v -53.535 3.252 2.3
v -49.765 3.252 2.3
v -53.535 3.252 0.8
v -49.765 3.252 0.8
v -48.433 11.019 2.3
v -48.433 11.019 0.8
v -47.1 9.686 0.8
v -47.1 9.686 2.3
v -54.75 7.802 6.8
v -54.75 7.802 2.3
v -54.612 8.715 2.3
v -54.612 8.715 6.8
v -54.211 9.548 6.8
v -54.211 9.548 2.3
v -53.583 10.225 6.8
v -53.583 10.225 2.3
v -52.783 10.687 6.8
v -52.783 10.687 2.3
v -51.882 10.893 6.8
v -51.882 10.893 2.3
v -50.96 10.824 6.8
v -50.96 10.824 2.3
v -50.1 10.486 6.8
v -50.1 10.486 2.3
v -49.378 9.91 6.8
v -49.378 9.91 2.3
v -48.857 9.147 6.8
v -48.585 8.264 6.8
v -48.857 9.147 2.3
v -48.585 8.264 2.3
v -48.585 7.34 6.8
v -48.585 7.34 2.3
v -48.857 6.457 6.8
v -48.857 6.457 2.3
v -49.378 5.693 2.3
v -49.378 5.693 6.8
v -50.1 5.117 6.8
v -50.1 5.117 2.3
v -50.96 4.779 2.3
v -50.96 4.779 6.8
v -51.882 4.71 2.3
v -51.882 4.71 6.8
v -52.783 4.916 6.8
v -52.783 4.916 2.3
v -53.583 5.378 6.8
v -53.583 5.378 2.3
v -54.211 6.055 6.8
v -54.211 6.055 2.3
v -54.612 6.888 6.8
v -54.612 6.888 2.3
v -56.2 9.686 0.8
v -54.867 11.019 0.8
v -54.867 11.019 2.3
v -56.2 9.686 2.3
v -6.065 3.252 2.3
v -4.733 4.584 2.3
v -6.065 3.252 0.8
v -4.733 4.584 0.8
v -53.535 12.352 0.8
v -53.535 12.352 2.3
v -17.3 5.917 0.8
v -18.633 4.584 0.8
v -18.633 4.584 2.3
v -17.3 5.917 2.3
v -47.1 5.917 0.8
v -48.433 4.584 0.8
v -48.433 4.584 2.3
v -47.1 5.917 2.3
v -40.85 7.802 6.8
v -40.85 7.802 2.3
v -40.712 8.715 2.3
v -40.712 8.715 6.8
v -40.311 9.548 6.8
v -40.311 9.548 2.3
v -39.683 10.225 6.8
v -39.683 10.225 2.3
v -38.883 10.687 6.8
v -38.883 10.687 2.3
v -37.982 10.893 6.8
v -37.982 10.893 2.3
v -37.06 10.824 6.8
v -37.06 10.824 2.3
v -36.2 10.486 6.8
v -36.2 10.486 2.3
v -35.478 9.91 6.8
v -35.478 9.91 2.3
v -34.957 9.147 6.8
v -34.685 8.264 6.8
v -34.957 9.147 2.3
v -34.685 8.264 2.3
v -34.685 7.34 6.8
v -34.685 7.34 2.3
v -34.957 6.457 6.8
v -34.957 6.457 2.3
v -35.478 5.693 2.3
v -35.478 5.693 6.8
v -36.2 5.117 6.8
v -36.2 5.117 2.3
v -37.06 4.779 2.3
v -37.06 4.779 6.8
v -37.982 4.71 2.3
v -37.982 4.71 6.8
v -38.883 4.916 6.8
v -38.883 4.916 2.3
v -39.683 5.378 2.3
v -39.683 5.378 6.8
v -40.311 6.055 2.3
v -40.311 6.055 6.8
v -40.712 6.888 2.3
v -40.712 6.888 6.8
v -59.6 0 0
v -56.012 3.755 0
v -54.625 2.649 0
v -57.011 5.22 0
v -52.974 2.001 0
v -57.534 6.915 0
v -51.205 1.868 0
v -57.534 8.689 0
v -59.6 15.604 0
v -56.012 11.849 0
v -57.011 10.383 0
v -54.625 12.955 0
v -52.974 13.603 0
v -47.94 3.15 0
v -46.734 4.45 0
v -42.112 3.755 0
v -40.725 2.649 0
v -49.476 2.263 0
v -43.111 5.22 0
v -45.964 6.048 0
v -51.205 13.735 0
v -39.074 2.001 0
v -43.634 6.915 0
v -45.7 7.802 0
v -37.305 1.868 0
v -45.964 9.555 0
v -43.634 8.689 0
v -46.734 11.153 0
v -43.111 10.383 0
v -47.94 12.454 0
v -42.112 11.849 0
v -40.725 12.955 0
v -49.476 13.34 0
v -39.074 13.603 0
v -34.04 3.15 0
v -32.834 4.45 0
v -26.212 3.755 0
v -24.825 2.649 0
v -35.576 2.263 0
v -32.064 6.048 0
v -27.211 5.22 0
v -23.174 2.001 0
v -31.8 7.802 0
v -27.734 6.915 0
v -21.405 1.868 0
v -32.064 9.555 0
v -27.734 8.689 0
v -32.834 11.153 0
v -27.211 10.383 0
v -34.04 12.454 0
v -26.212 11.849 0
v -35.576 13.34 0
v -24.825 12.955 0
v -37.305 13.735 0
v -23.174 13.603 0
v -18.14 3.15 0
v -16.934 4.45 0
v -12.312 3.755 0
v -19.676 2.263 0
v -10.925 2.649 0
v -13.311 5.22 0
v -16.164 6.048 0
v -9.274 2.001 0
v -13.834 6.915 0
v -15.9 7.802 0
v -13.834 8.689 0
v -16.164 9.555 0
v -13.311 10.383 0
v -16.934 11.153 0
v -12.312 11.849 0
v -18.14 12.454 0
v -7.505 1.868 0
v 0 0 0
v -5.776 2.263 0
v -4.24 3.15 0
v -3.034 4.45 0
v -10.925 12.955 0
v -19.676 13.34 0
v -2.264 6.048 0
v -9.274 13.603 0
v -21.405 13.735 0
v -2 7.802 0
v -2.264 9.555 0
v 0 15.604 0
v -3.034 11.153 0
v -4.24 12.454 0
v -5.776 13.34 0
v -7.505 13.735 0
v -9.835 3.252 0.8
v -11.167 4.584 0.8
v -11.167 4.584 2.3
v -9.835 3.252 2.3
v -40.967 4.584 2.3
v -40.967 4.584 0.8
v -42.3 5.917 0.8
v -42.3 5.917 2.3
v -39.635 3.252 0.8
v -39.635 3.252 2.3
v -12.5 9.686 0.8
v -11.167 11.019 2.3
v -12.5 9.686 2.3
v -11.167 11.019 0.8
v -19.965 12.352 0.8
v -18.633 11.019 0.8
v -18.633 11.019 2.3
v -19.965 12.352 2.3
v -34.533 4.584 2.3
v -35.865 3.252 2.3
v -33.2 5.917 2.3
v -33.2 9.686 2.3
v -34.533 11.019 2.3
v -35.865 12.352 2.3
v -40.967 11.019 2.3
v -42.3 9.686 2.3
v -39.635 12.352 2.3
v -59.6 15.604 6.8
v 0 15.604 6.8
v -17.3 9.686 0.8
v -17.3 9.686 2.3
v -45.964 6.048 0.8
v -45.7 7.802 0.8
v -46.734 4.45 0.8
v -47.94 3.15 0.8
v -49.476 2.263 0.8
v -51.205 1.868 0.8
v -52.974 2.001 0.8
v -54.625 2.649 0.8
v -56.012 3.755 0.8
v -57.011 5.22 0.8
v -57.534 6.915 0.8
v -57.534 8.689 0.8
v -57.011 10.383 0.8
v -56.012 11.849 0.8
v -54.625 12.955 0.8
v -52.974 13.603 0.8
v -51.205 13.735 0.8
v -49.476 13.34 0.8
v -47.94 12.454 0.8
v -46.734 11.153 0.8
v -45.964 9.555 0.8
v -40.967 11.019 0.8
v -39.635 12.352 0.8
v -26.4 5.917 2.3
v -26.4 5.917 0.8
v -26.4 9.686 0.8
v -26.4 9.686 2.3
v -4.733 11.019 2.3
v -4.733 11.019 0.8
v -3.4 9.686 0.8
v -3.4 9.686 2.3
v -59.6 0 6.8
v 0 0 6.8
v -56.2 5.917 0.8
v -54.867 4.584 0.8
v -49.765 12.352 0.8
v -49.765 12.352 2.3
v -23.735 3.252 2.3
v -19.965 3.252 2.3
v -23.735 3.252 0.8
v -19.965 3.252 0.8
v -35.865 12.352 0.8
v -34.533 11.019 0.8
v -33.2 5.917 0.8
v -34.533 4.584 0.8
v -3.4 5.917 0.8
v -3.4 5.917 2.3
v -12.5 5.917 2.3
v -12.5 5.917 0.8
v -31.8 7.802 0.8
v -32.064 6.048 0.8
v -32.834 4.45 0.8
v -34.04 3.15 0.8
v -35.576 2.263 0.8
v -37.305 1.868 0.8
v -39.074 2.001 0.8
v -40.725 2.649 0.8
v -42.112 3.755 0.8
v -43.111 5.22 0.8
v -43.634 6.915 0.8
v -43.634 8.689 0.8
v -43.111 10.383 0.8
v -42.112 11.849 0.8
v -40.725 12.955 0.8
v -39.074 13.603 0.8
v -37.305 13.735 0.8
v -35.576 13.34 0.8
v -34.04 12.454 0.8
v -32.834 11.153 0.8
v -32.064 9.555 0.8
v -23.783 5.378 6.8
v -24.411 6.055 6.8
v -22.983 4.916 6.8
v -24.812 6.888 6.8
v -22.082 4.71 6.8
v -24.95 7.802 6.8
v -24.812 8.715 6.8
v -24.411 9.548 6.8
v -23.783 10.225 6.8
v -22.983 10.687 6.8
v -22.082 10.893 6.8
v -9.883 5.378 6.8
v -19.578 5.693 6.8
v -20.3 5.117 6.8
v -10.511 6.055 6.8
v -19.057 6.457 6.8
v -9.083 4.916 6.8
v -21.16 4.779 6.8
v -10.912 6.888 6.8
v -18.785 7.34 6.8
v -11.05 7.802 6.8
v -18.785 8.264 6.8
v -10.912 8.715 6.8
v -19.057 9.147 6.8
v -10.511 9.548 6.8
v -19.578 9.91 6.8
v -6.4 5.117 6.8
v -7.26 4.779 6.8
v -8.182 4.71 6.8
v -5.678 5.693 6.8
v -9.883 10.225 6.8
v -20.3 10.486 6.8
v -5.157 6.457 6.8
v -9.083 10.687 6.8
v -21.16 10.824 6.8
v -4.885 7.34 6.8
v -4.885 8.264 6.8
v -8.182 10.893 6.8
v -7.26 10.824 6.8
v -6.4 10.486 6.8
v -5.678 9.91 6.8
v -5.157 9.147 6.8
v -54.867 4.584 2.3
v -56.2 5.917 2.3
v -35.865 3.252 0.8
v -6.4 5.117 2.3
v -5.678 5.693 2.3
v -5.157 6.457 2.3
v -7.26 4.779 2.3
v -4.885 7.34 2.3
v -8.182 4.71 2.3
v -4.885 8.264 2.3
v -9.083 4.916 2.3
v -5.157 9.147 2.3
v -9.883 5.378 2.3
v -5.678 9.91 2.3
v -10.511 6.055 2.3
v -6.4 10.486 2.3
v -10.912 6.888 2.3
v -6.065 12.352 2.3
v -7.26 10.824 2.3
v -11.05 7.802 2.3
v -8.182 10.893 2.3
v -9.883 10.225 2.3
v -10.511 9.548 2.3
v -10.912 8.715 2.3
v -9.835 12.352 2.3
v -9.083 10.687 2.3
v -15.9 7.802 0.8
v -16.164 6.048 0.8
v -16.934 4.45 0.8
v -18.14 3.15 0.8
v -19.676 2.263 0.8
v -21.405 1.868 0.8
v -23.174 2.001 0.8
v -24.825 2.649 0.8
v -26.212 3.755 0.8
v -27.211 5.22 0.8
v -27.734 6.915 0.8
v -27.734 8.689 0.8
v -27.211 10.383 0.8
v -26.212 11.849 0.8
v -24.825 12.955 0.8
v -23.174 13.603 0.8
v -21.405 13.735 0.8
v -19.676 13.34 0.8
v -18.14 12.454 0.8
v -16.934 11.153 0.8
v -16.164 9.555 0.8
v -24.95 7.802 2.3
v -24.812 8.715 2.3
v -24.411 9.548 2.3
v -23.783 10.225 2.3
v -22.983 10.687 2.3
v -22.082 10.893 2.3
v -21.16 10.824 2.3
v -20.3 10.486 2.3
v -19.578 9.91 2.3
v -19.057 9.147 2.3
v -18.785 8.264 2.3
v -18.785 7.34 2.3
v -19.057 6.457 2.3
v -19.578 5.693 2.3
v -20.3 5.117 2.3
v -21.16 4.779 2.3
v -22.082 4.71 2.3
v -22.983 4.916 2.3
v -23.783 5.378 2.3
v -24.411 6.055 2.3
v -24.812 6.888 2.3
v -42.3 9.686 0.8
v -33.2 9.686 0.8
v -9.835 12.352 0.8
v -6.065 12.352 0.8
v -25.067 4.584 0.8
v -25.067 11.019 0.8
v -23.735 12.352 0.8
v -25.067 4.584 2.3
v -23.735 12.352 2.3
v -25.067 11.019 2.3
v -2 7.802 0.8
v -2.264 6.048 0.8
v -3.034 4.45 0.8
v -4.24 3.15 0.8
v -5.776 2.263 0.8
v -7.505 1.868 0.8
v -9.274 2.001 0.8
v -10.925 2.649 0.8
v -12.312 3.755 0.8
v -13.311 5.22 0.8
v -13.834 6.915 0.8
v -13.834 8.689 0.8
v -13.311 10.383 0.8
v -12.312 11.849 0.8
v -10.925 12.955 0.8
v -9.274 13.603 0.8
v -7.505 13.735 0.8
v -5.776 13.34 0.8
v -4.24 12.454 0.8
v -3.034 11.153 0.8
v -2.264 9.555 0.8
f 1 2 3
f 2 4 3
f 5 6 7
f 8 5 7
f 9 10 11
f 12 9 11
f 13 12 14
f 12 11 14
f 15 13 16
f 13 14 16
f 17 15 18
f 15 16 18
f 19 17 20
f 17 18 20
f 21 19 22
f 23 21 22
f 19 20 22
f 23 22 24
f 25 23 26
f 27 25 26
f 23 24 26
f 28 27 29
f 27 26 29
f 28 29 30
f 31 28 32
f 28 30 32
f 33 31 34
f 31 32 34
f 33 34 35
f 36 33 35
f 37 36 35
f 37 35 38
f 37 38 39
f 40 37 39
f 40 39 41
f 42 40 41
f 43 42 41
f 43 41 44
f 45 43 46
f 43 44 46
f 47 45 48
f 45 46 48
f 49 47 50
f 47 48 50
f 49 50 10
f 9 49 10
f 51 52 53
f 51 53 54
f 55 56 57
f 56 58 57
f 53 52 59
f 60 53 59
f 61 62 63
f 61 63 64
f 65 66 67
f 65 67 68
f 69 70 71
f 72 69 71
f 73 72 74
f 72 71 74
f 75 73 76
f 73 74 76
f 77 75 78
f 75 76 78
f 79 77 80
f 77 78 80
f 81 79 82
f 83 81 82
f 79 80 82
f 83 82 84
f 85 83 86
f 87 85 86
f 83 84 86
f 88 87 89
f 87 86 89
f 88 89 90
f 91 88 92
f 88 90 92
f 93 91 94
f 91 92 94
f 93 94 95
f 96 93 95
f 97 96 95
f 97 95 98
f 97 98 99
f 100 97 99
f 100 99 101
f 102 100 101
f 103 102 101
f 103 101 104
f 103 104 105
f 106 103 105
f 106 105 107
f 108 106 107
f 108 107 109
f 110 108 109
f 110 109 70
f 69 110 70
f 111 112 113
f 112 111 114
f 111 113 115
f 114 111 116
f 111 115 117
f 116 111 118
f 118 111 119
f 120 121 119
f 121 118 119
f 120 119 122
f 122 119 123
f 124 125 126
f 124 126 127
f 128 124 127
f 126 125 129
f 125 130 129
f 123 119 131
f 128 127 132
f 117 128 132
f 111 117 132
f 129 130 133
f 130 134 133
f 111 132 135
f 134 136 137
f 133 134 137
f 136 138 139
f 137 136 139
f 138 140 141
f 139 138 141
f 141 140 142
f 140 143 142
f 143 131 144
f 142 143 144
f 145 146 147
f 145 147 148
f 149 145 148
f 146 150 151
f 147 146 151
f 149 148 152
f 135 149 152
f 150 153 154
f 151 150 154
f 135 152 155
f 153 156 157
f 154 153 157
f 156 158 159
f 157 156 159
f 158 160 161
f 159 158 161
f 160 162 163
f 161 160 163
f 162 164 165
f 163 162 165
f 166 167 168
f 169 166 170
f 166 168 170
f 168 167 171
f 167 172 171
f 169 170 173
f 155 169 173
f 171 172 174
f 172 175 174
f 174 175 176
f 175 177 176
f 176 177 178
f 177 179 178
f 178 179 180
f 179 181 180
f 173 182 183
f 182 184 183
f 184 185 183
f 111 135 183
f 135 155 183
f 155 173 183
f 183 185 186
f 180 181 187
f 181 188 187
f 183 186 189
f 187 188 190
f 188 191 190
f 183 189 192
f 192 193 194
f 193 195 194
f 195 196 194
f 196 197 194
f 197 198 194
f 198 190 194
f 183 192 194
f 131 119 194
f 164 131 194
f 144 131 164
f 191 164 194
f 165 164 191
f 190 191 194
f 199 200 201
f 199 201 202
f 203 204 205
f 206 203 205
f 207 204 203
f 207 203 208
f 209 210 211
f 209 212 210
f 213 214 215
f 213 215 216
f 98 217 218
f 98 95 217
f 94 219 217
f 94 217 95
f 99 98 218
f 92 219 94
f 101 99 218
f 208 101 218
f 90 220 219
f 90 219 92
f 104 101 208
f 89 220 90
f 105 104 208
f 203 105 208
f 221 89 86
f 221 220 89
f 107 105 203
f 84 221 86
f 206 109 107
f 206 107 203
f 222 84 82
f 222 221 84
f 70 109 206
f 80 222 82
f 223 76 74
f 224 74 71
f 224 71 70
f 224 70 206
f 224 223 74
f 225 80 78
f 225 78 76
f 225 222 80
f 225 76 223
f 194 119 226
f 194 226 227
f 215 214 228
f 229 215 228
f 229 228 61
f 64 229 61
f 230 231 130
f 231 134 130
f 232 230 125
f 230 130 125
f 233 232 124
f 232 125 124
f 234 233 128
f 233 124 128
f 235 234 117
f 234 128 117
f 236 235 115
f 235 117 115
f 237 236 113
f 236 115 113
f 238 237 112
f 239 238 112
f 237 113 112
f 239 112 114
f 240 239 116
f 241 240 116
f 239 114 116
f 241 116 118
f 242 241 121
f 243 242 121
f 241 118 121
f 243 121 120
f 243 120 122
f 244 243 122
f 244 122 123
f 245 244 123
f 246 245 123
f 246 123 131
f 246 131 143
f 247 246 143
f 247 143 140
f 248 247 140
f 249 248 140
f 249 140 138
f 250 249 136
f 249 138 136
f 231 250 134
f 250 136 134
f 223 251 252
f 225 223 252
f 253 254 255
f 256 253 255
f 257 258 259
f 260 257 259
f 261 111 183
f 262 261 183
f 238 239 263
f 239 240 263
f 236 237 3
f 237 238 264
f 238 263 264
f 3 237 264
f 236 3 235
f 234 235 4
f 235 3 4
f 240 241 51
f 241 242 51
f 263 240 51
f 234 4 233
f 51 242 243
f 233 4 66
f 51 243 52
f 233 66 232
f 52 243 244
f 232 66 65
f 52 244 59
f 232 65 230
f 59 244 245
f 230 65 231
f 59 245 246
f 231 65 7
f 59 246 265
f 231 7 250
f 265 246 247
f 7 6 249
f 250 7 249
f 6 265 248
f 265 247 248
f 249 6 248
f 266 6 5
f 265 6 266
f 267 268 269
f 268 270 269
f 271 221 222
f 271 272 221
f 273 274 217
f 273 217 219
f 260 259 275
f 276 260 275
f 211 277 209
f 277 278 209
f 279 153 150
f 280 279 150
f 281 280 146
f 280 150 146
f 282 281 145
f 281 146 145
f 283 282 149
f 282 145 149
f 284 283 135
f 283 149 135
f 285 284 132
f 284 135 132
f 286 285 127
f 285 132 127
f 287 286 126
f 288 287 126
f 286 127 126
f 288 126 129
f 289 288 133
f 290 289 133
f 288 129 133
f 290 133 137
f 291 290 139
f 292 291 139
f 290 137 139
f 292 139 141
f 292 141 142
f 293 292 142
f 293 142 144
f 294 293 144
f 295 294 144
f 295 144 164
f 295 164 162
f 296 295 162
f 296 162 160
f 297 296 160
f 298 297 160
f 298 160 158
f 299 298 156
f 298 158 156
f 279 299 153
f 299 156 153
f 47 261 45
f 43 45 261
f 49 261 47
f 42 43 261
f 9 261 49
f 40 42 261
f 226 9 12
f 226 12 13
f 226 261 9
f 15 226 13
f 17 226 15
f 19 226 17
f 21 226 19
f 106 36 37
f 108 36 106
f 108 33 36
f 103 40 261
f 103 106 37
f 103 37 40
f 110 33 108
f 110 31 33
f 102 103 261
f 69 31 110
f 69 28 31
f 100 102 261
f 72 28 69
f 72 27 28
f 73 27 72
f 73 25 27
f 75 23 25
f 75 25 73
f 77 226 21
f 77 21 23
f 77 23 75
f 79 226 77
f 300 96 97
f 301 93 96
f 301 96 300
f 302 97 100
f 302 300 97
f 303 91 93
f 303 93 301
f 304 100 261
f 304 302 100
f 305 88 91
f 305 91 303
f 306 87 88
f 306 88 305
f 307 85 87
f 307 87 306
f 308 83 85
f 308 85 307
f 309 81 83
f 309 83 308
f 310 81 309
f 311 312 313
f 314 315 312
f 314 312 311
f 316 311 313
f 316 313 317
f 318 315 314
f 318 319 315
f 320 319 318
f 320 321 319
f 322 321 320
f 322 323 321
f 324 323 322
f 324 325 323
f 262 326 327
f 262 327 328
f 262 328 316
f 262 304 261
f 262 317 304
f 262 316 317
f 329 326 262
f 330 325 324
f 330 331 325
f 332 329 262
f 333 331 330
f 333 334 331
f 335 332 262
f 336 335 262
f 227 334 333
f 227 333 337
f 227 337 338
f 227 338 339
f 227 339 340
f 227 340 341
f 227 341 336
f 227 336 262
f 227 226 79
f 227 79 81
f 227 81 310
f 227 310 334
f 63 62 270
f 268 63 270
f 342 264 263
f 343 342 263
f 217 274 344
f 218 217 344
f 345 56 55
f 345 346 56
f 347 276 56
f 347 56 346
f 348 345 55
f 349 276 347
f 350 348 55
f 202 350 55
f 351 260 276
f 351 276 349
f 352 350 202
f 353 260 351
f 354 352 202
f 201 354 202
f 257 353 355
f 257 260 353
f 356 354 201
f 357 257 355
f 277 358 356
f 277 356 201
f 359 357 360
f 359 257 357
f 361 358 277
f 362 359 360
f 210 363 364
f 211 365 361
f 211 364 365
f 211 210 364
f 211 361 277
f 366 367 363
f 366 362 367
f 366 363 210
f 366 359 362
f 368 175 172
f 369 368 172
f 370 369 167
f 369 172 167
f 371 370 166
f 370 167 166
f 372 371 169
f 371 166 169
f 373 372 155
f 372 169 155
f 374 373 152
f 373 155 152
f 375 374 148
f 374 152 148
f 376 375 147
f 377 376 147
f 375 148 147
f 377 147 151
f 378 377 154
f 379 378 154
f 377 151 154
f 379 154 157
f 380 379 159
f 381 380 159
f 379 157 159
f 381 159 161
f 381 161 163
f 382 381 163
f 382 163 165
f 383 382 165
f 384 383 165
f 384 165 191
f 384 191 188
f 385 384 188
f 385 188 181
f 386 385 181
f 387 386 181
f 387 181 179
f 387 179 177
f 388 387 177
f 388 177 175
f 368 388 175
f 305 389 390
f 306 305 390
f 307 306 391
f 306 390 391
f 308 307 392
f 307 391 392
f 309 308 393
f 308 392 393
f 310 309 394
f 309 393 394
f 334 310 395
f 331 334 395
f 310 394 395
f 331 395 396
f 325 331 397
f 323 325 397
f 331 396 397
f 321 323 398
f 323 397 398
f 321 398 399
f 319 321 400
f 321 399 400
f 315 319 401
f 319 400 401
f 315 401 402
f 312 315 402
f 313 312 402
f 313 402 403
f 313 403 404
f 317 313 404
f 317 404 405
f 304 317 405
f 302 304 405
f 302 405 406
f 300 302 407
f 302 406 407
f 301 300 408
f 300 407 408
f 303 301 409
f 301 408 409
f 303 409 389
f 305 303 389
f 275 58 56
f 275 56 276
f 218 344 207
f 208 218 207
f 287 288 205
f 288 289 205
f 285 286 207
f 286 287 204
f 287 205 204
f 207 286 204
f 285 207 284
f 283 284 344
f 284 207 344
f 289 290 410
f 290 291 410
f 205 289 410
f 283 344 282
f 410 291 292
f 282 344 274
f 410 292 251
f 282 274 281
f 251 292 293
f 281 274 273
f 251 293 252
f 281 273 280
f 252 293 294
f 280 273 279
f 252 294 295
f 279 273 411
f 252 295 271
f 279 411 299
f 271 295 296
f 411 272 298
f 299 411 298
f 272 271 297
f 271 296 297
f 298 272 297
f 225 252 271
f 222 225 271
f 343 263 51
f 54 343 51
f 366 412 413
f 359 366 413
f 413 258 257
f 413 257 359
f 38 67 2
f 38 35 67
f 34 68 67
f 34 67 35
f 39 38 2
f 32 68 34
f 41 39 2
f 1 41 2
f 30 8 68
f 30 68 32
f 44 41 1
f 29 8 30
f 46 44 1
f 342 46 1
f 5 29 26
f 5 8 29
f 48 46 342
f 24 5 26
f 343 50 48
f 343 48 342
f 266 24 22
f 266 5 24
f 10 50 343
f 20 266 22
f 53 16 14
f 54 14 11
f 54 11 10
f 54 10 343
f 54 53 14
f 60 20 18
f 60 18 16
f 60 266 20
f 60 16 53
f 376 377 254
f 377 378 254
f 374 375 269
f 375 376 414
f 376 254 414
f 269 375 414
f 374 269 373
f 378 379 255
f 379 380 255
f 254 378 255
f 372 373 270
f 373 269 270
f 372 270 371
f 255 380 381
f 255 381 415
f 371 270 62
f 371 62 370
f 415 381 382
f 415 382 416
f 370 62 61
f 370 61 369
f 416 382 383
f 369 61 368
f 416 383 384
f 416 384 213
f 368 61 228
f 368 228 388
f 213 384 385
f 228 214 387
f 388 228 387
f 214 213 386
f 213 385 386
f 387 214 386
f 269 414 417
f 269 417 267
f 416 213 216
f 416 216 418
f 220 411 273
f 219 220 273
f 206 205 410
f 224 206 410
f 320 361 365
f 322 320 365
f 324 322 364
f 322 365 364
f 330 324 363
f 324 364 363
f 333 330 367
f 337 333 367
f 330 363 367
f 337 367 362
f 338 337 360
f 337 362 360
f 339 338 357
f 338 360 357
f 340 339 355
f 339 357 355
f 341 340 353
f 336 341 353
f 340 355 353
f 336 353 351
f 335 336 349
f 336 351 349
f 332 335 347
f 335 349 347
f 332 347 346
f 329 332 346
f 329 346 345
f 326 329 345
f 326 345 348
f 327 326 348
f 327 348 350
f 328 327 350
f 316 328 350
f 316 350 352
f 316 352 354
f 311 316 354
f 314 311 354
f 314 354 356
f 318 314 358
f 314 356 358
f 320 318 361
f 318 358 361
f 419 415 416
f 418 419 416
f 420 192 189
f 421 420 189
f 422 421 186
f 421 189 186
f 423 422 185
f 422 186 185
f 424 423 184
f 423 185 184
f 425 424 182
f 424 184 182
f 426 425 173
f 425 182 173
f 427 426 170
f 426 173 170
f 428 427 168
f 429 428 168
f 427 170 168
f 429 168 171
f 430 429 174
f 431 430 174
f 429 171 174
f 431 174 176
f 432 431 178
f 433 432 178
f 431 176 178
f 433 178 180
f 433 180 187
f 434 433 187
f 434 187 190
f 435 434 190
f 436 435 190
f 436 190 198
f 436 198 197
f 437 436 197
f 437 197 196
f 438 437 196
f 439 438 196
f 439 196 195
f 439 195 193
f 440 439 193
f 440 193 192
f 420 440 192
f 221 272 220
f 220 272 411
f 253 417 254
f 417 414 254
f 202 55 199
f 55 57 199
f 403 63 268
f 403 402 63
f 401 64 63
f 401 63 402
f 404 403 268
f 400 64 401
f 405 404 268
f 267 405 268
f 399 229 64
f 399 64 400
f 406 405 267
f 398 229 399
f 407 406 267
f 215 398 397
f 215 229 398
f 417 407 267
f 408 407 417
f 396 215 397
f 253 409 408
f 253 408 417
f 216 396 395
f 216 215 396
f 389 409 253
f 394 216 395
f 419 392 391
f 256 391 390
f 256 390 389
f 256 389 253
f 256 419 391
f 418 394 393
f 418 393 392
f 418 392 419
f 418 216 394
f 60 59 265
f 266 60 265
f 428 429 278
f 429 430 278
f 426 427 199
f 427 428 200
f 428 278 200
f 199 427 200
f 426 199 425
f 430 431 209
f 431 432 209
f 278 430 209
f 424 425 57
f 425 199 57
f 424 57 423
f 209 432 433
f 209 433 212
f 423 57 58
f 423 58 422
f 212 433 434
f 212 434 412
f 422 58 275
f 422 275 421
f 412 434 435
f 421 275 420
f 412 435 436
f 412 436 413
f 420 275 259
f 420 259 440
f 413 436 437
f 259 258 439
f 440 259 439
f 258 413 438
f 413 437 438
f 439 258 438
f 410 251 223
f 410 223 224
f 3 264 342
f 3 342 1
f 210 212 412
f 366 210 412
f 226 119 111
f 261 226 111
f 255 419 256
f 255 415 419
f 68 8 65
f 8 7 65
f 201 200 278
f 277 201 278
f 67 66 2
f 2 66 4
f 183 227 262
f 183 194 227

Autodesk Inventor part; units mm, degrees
ref_plane "YZ Plane" through (0, 0, 0) normal (1, 0, 0) x (0, 1, 0)
ref_plane "XZ Plane" through (0, 0, 0) normal (0, 1, 0) x (-1, 0, 0)
ref_plane "XY Plane" through (0, 0, 0) normal (0, 0, 1) x (1, 0, 0)
sketch "Sketch1" plane through (0, 0, 0) normal (0, 0, 1) x (1, 0, 0)
  line L0 (0, 0) -> (-29.8, 0)
  line L1 (0, 15.6035) -> (0, 0)
  circle A0 centre (-7.95, 7.8017) radius 5.95
  circle A1 centre (-21.85, 7.8017) radius 5.95
  line L2 (-29.8, 15.6035) -> (-29.8, 0)
  line L3 (-29.8, 15.6035) -> (0, 15.6035)
  line L4 (-29.8, 0) -> (-60, 0)
  line L5 (-21.85, 7.8017) -> (-21.85, 15.6035)
  line L6 (-21.85, 7.8017) -> (-21.85, 0)
  line L7 (-7.95, 7.8017) -> (-7.95, 0)
  line L8 (-7.95, 7.8017) -> (-7.95, 15.6035)
  line L9 (-59.6, 0) -> (-29.8, 0)
  line L10 (-59.6, 15.6035) -> (-59.6, 0)
  circle A2 centre (-51.65, 7.8017) radius 5.95
  circle A3 centre (-37.75, 7.8017) radius 5.95
  line L11 (-29.8, 15.6035) -> (-59.6, 15.6035)
  line L12 (-37.75, 7.8017) -> (-37.75, 15.6035)
  line L13 (-37.75, 7.8017) -> (-37.75, 0)
  line L14 (-51.65, 7.8017) -> (-51.65, 0)
  line L15 (-51.65, 7.8017) -> (-51.65, 15.6035)
  point P0 (0, 7.8017)
  point P1 (-59.6, 7.8017)
  dimension "d0" = 11.9
  dimension "d1" = 11.9
  dimension "d7" = 7.95
  dimension "d8" = 13.9
  dimension "d9" = 7.95
extrude "Extrusion1" add sketch "Sketch1" along normal blind 0.8 contours L0 L7 A0 L8 L3 L1 | L0 L6 A1 L5 L3 L8 A0 L7 | L0 L2 L3 L5 A1 L6 | L4 L13 A3 L12 L11 L2 | L4 L14 A2 L15 L11 L12 A3 L13 | L4 L10 L11 L15 A2 L14
sketch "Sketch2" plane through (0, 0, 0.8) normal (0, 0, 1) x (1, 0, 0)
  line L0 (-59.6, 15.6035) -> (-59.6, 0) projected
  line L1 (-59.6, 0) -> (0, 0) projected
  line L2 (-59.6, 15.6035) -> (0, 15.6035)
  line L3 (0, 15.6035) -> (0, 0)
  line L4 (0, 0) -> (-59.6, 0)
  line L5 (-59.6, 0) -> (-59.6, 15.6035)
extrude "Extrusion2" add sketch "Sketch2" along normal blind 6
sketch "Sketch3" plane through (-7.95, 7.8017, 0.8) normal (0, 0, -1) x (-1, 0, 0)
  circle A0 centre (0, 0) radius 5.95 projected
  line L0 (0, 0) -> (-4.55, 0)
  line L1 (0, 0) -> (4.55, 0)
  line L2 (0, 0) -> (0, 4.55)
  line L3 (0, 0) -> (0, -4.55)
  line L4 (-4.55, 0) -> (-4.55, -1.8847)
  line L5 (0, 0) -> (2.5958, -2.5958)
  line L6 (0, 0) -> (3.671, 0) construction
  line L7 (3.2173, -3.2173) -> (-3.2173, 3.2173)
  line L8 (0, 0) -> (-3.2173, -3.2173)
  line L9 (0, 0) -> (3.2173, 3.2173)
  line L10 (-3.2173, -3.2173) -> (-1.8847, -4.55)
  line L11 (-3.2173, -3.2173) -> (-4.55, -1.8847)
  line L12 (3.2173, -3.2173) -> (1.8847, -4.55)
  line L13 (3.2173, -3.2173) -> (4.55, -1.8847)
  line L14 (4.55, 0) -> (4.55, -1.8847)
  line L15 (4.55, 0) -> (4.55, 1.8847)
  line L16 (3.2173, 3.2173) -> (4.55, 1.8847)
  line L17 (3.2173, 3.2173) -> (1.8847, 4.55)
  line L18 (0, 4.55) -> (1.8847, 4.55)
  line L19 (0, 4.55) -> (-1.8847, 4.55)
  line L20 (-3.2173, 3.2173) -> (-1.8847, 4.55)
  line L21 (-3.2173, 3.2173) -> (-4.55, 1.8847)
  line L22 (0, -4.55) -> (1.8847, -4.55)
  line L23 (0, -4.55) -> (-1.8847, -4.55)
  line L24 (-4.55, 0) -> (-4.55, 1.8847)
  line L25 (5.95, 0) -> (7.95, 0)
  circle A1 centre (13.9, 0) radius 5.95 projected
  line L26 (6.95, 0) -> (6.95, 2.7112)
  line L27 (-7.95, 7.8017) -> (51.65, 7.8017) projected
  circle A2 centre (13.9, 0) radius 5.95
  line L28 (13.9, 0) -> (18.45, 0)
  line L29 (13.9, 0) -> (9.35, 0)
  line L30 (13.9, 0) -> (13.9, 4.55)
  line L31 (13.9, 0) -> (13.9, -4.55)
  line L32 (18.45, 0) -> (18.45, -1.8847)
  line L33 (13.9, 0) -> (11.3042, -2.5958)
  line L34 (13.9, 0) -> (10.229, 0) construction
  line L35 (10.6827, -3.2173) -> (17.1173, 3.2173)
  line L36 (13.9, 0) -> (17.1173, -3.2173)
  line L37 (13.9, 0) -> (10.6827, 3.2173)
  line L38 (17.1173, -3.2173) -> (15.7847, -4.55)
  line L39 (17.1173, -3.2173) -> (18.45, -1.8847)
  line L40 (10.6827, -3.2173) -> (12.0153, -4.55)
  line L41 (10.6827, -3.2173) -> (9.35, -1.8847)
  line L42 (9.35, 0) -> (9.35, -1.8847)
  line L43 (9.35, 0) -> (9.35, 1.8847)
  line L44 (10.6827, 3.2173) -> (9.35, 1.8847)
  line L45 (10.6827, 3.2173) -> (12.0153, 4.55)
  line L46 (13.9, 4.55) -> (12.0153, 4.55)
  line L47 (13.9, 4.55) -> (15.7847, 4.55)
  line L48 (17.1173, 3.2173) -> (15.7847, 4.55)
  line L49 (17.1173, 3.2173) -> (18.45, 1.8847)
  line L50 (13.9, -4.55) -> (12.0153, -4.55)
  line L51 (13.9, -4.55) -> (15.7847, -4.55)
  line L52 (18.45, 0) -> (18.45, 1.8847)
  line L53 (21.85, 7.8017) -> (21.85, -7.8017)
  line L54 (51.65, -7.8017) -> (-7.95, -7.8017) projected
  circle A3 centre (43.7, 0) radius 5.95
  line L55 (43.7, 0) -> (48.25, 0)
  line L56 (43.7, 0) -> (39.15, 0)
  line L57 (43.7, 0) -> (43.7, 4.55)
  line L58 (43.7, 0) -> (43.7, -4.55)
  line L59 (48.25, 0) -> (48.25, -1.8847)
  line L60 (43.7, 0) -> (41.1042, -2.5958)
  line L61 (43.7, 0) -> (40.029, 0) construction
  line L62 (40.4827, -3.2173) -> (46.9173, 3.2173)
  line L63 (43.7, 0) -> (46.9173, -3.2173)
  line L64 (43.7, 0) -> (40.4827, 3.2173)
  line L65 (46.9173, -3.2173) -> (45.5847, -4.55)
  line L66 (46.9173, -3.2173) -> (48.25, -1.8847)
  line L67 (40.4827, -3.2173) -> (41.8153, -4.55)
  line L68 (40.4827, -3.2173) -> (39.15, -1.8847)
  line L69 (39.15, 0) -> (39.15, -1.8847)
  line L70 (39.15, 0) -> (39.15, 1.8847)
  line L71 (40.4827, 3.2173) -> (39.15, 1.8847)
  line L72 (40.4827, 3.2173) -> (41.8153, 4.55)
  line L73 (43.7, 4.55) -> (41.8153, 4.55)
  line L74 (43.7, 4.55) -> (45.5847, 4.55)
  line L75 (46.9173, 3.2173) -> (45.5847, 4.55)
  line L76 (46.9173, 3.2173) -> (48.25, 1.8847)
  line L77 (43.7, -4.55) -> (41.8153, -4.55)
  line L78 (43.7, -4.55) -> (45.5847, -4.55)
  line L79 (48.25, 0) -> (48.25, 1.8847)
  line L80 (37.75, 0) -> (35.75, 0)
  circle A4 centre (29.8, 0) radius 5.95
  line L81 (36.75, 0) -> (36.75, 2.7112)
  line L82 (25.25, 0) -> (25.25, 1.8847)
  line L83 (25.25, 0) -> (25.25, -1.8847)
  line L84 (29.8, 0) -> (25.25, 0)
  line L85 (29.8, 0) -> (29.8, 4.55)
  line L86 (29.8, 0) -> (29.8, -4.55)
  line L87 (29.8, -4.55) -> (27.9153, -4.55)
  line L88 (29.8, 4.55) -> (31.6847, 4.55)
  line L89 (29.8, 0) -> (33.0173, 3.2173)
  line L90 (29.8, 0) -> (32.3958, -2.5958)
  line L91 (29.8, -4.55) -> (31.6847, -4.55)
  line L92 (33.0173, 3.2173) -> (34.35, 1.8847)
  line L93 (34.35, 0) -> (34.35, -1.8847)
  line L94 (33.0173, -3.2173) -> (26.5827, 3.2173)
  line L95 (33.0173, -3.2173) -> (34.35, -1.8847)
  circle A5 centre (29.8, 0) radius 5.95
  line L96 (33.0173, -3.2173) -> (31.6847, -4.55)
  line L97 (29.8, 0) -> (34.35, 0)
  line L98 (34.35, 0) -> (34.35, 1.8847)
  line L99 (29.8, 0) -> (33.471, 0) construction
  line L100 (26.5827, 3.2173) -> (27.9153, 4.55)
  line L101 (33.0173, 3.2173) -> (31.6847, 4.55)
  line L102 (29.8, 4.55) -> (27.9153, 4.55)
  line L103 (26.5827, 3.2173) -> (25.25, 1.8847)
  line L104 (26.5827, -3.2173) -> (25.25, -1.8847)
  line L105 (26.5827, -3.2173) -> (27.9153, -4.55)
  line L106 (29.8, 0) -> (26.5827, -3.2173)
  dimension "d14" = 4.55
  dimension "d15" = 4.55
  dimension "d16" = 4.55
  dimension "d17" = 4.55
  dimension "d22" = 45
sketch "Sketch4" plane through (-37.75, 7.8017, 0.8) normal (0, 0, -1) x (-1, 0, 0)
  line L0 (3.2173, -3.2173) -> (1.8847, -4.55) projected
  line L1 (3.2173, -3.2173) -> (4.55, -1.8847) projected
  line L2 (4.55, 0) -> (4.55, -1.8847) projected
  line L3 (4.55, 0) -> (4.55, 1.8847) projected
  line L4 (3.2173, 3.2173) -> (4.55, 1.8847) projected
  line L5 (3.2173, 3.2173) -> (1.8847, 4.55) projected
  line L6 (0, 4.55) -> (1.8847, 4.55) projected
  line L7 (0, 4.55) -> (-1.8847, 4.55) projected
  line L8 (-3.2173, 3.2173) -> (-1.8847, 4.55) projected
  line L9 (-3.2173, 3.2173) -> (-4.55, 1.8847) projected
  line L10 (-4.55, 0) -> (-4.55, 1.8847) projected
  line L11 (-4.55, 0) -> (-4.55, -1.8847) projected
  line L12 (-3.2173, -3.2173) -> (-4.55, -1.8847) projected
  line L13 (-3.2173, -3.2173) -> (-1.8847, -4.55) projected
  line L14 (0, -4.55) -> (-1.8847, -4.55) projected
  line L15 (0, -4.55) -> (1.8847, -4.55) projected
  line L16 (-4.55, 1.8847) -> (-4.55, -1.8847)
  line L17 (-1.8847, -4.55) -> (1.8847, -4.55)
  line L18 (4.55, -1.8847) -> (4.55, 1.8847)
  line L19 (1.8847, 4.55) -> (-1.8847, 4.55)
  line L20 (1.8847, -4.55) -> (4.55, -1.8847)
  line L21 (-1.8847, -4.55) -> (-4.55, -1.8847)
  line L22 (-4.55, 1.8847) -> (-1.8847, 4.55)
  line L23 (1.8847, 4.55) -> (4.55, 1.8847)
  circle A0 centre (0, 0) radius 5.95 projected
  circle A1 centre (0, 0) radius 5.95
  line L24 (10.6827, 3.2173) -> (12.0153, 4.55) projected
  line L25 (10.6827, 3.2173) -> (9.35, 1.8847) projected
  line L26 (9.35, 0) -> (9.35, 1.8847) projected
  line L27 (9.35, 0) -> (9.35, -1.8847) projected
  line L28 (10.6827, -3.2173) -> (9.35, -1.8847) projected
  line L29 (10.6827, -3.2173) -> (12.0153, -4.55) projected
  line L30 (13.9, -4.55) -> (12.0153, -4.55) projected
  line L31 (13.9, -4.55) -> (15.7847, -4.55) projected
  line L32 (17.1173, -3.2173) -> (15.7847, -4.55) projected
  line L33 (17.1173, -3.2173) -> (18.45, -1.8847) projected
  line L34 (18.45, 0) -> (18.45, -1.8847) projected
  line L35 (18.45, 0) -> (18.45, 1.8847) projected
  line L36 (17.1173, 3.2173) -> (18.45, 1.8847) projected
  line L37 (17.1173, 3.2173) -> (15.7847, 4.55) projected
  line L38 (13.9, 4.55) -> (15.7847, 4.55) projected
  line L39 (13.9, 4.55) -> (12.0153, 4.55) projected
  line L40 (9.35, 1.8847) -> (12.0153, 4.55)
  line L41 (12.0153, 4.55) -> (15.7847, 4.55)
  line L42 (15.7847, 4.55) -> (18.45, 1.8847)
  line L43 (18.45, 1.8847) -> (18.45, -1.8847)
  line L44 (18.45, -1.8847) -> (15.7847, -4.55)
  line L45 (9.35, -1.8847) -> (12.0153, -4.55)
  line L46 (-15.9, 4.55) -> (-17.7847, 4.55) projected
  line L47 (-15.9, 4.55) -> (-14.0153, 4.55) projected
  line L48 (-12.6827, 3.2173) -> (-14.0153, 4.55) projected
  line L49 (-12.6827, 3.2173) -> (-11.35, 1.8847) projected
  line L50 (-11.35, 0) -> (-11.35, 1.8847) projected
  line L51 (-11.35, 0) -> (-11.35, -1.8847) projected
  line L52 (-12.6827, -3.2173) -> (-11.35, -1.8847) projected
  line L53 (-12.6827, -3.2173) -> (-14.0153, -4.55) projected
  line L54 (-15.9, -4.55) -> (-14.0153, -4.55) projected
  line L55 (-15.9, -4.55) -> (-17.7847, -4.55) projected
  line L56 (-19.1173, -3.2173) -> (-17.7847, -4.55) projected
  line L57 (-19.1173, -3.2173) -> (-20.45, -1.8847) projected
  line L58 (-20.45, 0) -> (-20.45, -1.8847) projected
  line L59 (-20.45, 0) -> (-20.45, 1.8847) projected
  line L60 (-19.1173, 3.2173) -> (-20.45, 1.8847) projected
  line L61 (-19.1173, 3.2173) -> (-17.7847, 4.55) projected
  line L62 (-17.7847, 4.55) -> (-14.0153, 4.55)
  line L63 (-11.35, 1.8847) -> (-14.0153, 4.55)
  line L64 (-17.7847, 4.55) -> (-20.45, 1.8847)
  line L65 (-20.45, -1.8847) -> (-17.7847, -4.55)
  line L66 (-17.7847, -4.55) -> (-14.0153, -4.55)
  line L67 (-11.35, -1.8847) -> (-11.35, 1.8847)
  line L68 (-11.35, -1.8847) -> (-14.0153, -4.55)
  circle A2 centre (-15.9, 0) radius 5.95
  line L69 (-33.0173, 3.2173) -> (-34.35, 1.8847) projected
  line L70 (-33.0173, 3.2173) -> (-31.6847, 4.55) projected
  line L71 (-29.8, 4.55) -> (-31.6847, 4.55) projected
  line L72 (-29.8, 4.55) -> (-27.9153, 4.55) projected
  line L73 (-26.5827, 3.2173) -> (-27.9153, 4.55) projected
  line L74 (-26.5827, 3.2173) -> (-25.25, 1.8847) projected
  line L75 (-25.25, 0) -> (-25.25, 1.8847) projected
  line L76 (-25.25, 0) -> (-25.25, -1.8847) projected
  line L77 (-26.5827, -3.2173) -> (-25.25, -1.8847) projected
  line L78 (-26.5827, -3.2173) -> (-27.9153, -4.55) projected
  line L79 (-29.8, -4.55) -> (-27.9153, -4.55) projected
  line L80 (-29.8, -4.55) -> (-31.6847, -4.55) projected
  line L81 (-33.0173, -3.2173) -> (-31.6847, -4.55) projected
  line L82 (-33.0173, -3.2173) -> (-34.35, -1.8847) projected
  line L83 (-34.35, 0) -> (-34.35, -1.8847) projected
  line L84 (-34.35, 1.8847) -> (-31.6847, 4.55)
  line L85 (-27.9153, 4.55) -> (-25.25, 1.8847)
  line L86 (-25.25, -1.8847) -> (-27.9153, -4.55)
  line L87 (-31.6847, -4.55) -> (-27.9153, -4.55)
  line L88 (-34.35, -1.8847) -> (-31.6847, -4.55)
  line L89 (-34.35, -1.8847) -> (-34.35, 1.8847)
  circle A3 centre (-29.8, 0) radius 5.95
  circle A4 centre (13.9, 0) radius 5.95
  circle A5 centre (13.9, 0) radius 5.95
  line L90 (-31.6847, 4.55) -> (-27.9153, 4.55)
  line L91 (-25.25, 1.8847) -> (-25.25, -1.8847)
  line L92 (-20.45, -1.8847) -> (-20.45, 1.8847)
  line L93 (9.35, -1.8847) -> (9.35, 1.8847)
  line L94 (12.0153, -4.55) -> (15.7847, -4.55)
  point P0 (-37.75, -7.8017)
extrude "Extrusion3" cut sketch "Sketch4" against normal blind 1.5 contours L0 L15 L14 L13 L12 L11 L10 L9 L8 L7 L6 L5 L4 L3 L2 L1 | L24 L39 L38 L37 L36 L35 L34 L33 L32 L31 L30 L29 L28 L27 L26 L25 | L47 L48 L49 L50 L51 L52 L53 L54 L55 L56 L57 L58 L59 L60 L61 L46 | L70 L71 L72 L73 L74 L75 L76 L77 L78 L79 L80 L81 L82 L83 L89 L69
sketch "Sketch5" plane through (-37.75, 7.8017, 2.3) normal (0, 0, -1) x (-1, 0, 0)
  circle A0 centre (0, 0) radius 3.1
  circle A1 centre (0, 0) radius 3.1
  circle A2 centre (13.9, 0) radius 3.1
  circle A3 centre (-15.9, 0) radius 3.1
  circle A4 centre (-29.8, 0) radius 3.1
  line L0 (-25.25, 1.8847) -> (-25.25, -1.8847) projected
  line L1 (-34.35, -1.8847) -> (-34.35, 1.8847) projected
  line L2 (-25.25, -1.8847) -> (-27.9153, -4.55) projected
  circle A5 centre (-29.8, 0) radius 4.9249
  line L3 (-15.9, 0) -> (-20.45, 0)
  line L4 (-20.45, -1.8847) -> (-20.45, 1.8847) projected
  line L5 (-15.9, 0) -> (-11.35, 0)
  line L6 (-11.35, 1.8847) -> (-11.35, -1.8847) projected
  line L7 (0, 0) -> (-4.55, 0)
  line L8 (-4.55, -1.8847) -> (-4.55, 1.8847) projected
  line L9 (0, 0) -> (4.55, 0)
  line L10 (4.55, 1.8847) -> (4.55, -1.8847) projected
  line L11 (13.9, 0) -> (9.35, 0)
  line L12 (9.35, -1.8847) -> (9.35, 1.8847) projected
  line L13 (18.45, 1.8847) -> (18.45, -1.8847) projected
  line L14 (18.45, 0) -> (13.9, 0)
  point P0 (-37.75, -7.8017)
  dimension "d25" = 6.2
  dimension "d26" = 6.2
  dimension "d27" = 6.2
  dimension "d28" = 6.2
  dimension "d29" = 6.2
extrude "Extrusion4" cut sketch "Sketch5" against normal through all contours L9 L7 A0 | A0 L7 L9 | L14 L11 A2 | A2 L11 L14 | L5 L3 A3 | A3 L3 L5 | A4
properties part number "switch_mount"
